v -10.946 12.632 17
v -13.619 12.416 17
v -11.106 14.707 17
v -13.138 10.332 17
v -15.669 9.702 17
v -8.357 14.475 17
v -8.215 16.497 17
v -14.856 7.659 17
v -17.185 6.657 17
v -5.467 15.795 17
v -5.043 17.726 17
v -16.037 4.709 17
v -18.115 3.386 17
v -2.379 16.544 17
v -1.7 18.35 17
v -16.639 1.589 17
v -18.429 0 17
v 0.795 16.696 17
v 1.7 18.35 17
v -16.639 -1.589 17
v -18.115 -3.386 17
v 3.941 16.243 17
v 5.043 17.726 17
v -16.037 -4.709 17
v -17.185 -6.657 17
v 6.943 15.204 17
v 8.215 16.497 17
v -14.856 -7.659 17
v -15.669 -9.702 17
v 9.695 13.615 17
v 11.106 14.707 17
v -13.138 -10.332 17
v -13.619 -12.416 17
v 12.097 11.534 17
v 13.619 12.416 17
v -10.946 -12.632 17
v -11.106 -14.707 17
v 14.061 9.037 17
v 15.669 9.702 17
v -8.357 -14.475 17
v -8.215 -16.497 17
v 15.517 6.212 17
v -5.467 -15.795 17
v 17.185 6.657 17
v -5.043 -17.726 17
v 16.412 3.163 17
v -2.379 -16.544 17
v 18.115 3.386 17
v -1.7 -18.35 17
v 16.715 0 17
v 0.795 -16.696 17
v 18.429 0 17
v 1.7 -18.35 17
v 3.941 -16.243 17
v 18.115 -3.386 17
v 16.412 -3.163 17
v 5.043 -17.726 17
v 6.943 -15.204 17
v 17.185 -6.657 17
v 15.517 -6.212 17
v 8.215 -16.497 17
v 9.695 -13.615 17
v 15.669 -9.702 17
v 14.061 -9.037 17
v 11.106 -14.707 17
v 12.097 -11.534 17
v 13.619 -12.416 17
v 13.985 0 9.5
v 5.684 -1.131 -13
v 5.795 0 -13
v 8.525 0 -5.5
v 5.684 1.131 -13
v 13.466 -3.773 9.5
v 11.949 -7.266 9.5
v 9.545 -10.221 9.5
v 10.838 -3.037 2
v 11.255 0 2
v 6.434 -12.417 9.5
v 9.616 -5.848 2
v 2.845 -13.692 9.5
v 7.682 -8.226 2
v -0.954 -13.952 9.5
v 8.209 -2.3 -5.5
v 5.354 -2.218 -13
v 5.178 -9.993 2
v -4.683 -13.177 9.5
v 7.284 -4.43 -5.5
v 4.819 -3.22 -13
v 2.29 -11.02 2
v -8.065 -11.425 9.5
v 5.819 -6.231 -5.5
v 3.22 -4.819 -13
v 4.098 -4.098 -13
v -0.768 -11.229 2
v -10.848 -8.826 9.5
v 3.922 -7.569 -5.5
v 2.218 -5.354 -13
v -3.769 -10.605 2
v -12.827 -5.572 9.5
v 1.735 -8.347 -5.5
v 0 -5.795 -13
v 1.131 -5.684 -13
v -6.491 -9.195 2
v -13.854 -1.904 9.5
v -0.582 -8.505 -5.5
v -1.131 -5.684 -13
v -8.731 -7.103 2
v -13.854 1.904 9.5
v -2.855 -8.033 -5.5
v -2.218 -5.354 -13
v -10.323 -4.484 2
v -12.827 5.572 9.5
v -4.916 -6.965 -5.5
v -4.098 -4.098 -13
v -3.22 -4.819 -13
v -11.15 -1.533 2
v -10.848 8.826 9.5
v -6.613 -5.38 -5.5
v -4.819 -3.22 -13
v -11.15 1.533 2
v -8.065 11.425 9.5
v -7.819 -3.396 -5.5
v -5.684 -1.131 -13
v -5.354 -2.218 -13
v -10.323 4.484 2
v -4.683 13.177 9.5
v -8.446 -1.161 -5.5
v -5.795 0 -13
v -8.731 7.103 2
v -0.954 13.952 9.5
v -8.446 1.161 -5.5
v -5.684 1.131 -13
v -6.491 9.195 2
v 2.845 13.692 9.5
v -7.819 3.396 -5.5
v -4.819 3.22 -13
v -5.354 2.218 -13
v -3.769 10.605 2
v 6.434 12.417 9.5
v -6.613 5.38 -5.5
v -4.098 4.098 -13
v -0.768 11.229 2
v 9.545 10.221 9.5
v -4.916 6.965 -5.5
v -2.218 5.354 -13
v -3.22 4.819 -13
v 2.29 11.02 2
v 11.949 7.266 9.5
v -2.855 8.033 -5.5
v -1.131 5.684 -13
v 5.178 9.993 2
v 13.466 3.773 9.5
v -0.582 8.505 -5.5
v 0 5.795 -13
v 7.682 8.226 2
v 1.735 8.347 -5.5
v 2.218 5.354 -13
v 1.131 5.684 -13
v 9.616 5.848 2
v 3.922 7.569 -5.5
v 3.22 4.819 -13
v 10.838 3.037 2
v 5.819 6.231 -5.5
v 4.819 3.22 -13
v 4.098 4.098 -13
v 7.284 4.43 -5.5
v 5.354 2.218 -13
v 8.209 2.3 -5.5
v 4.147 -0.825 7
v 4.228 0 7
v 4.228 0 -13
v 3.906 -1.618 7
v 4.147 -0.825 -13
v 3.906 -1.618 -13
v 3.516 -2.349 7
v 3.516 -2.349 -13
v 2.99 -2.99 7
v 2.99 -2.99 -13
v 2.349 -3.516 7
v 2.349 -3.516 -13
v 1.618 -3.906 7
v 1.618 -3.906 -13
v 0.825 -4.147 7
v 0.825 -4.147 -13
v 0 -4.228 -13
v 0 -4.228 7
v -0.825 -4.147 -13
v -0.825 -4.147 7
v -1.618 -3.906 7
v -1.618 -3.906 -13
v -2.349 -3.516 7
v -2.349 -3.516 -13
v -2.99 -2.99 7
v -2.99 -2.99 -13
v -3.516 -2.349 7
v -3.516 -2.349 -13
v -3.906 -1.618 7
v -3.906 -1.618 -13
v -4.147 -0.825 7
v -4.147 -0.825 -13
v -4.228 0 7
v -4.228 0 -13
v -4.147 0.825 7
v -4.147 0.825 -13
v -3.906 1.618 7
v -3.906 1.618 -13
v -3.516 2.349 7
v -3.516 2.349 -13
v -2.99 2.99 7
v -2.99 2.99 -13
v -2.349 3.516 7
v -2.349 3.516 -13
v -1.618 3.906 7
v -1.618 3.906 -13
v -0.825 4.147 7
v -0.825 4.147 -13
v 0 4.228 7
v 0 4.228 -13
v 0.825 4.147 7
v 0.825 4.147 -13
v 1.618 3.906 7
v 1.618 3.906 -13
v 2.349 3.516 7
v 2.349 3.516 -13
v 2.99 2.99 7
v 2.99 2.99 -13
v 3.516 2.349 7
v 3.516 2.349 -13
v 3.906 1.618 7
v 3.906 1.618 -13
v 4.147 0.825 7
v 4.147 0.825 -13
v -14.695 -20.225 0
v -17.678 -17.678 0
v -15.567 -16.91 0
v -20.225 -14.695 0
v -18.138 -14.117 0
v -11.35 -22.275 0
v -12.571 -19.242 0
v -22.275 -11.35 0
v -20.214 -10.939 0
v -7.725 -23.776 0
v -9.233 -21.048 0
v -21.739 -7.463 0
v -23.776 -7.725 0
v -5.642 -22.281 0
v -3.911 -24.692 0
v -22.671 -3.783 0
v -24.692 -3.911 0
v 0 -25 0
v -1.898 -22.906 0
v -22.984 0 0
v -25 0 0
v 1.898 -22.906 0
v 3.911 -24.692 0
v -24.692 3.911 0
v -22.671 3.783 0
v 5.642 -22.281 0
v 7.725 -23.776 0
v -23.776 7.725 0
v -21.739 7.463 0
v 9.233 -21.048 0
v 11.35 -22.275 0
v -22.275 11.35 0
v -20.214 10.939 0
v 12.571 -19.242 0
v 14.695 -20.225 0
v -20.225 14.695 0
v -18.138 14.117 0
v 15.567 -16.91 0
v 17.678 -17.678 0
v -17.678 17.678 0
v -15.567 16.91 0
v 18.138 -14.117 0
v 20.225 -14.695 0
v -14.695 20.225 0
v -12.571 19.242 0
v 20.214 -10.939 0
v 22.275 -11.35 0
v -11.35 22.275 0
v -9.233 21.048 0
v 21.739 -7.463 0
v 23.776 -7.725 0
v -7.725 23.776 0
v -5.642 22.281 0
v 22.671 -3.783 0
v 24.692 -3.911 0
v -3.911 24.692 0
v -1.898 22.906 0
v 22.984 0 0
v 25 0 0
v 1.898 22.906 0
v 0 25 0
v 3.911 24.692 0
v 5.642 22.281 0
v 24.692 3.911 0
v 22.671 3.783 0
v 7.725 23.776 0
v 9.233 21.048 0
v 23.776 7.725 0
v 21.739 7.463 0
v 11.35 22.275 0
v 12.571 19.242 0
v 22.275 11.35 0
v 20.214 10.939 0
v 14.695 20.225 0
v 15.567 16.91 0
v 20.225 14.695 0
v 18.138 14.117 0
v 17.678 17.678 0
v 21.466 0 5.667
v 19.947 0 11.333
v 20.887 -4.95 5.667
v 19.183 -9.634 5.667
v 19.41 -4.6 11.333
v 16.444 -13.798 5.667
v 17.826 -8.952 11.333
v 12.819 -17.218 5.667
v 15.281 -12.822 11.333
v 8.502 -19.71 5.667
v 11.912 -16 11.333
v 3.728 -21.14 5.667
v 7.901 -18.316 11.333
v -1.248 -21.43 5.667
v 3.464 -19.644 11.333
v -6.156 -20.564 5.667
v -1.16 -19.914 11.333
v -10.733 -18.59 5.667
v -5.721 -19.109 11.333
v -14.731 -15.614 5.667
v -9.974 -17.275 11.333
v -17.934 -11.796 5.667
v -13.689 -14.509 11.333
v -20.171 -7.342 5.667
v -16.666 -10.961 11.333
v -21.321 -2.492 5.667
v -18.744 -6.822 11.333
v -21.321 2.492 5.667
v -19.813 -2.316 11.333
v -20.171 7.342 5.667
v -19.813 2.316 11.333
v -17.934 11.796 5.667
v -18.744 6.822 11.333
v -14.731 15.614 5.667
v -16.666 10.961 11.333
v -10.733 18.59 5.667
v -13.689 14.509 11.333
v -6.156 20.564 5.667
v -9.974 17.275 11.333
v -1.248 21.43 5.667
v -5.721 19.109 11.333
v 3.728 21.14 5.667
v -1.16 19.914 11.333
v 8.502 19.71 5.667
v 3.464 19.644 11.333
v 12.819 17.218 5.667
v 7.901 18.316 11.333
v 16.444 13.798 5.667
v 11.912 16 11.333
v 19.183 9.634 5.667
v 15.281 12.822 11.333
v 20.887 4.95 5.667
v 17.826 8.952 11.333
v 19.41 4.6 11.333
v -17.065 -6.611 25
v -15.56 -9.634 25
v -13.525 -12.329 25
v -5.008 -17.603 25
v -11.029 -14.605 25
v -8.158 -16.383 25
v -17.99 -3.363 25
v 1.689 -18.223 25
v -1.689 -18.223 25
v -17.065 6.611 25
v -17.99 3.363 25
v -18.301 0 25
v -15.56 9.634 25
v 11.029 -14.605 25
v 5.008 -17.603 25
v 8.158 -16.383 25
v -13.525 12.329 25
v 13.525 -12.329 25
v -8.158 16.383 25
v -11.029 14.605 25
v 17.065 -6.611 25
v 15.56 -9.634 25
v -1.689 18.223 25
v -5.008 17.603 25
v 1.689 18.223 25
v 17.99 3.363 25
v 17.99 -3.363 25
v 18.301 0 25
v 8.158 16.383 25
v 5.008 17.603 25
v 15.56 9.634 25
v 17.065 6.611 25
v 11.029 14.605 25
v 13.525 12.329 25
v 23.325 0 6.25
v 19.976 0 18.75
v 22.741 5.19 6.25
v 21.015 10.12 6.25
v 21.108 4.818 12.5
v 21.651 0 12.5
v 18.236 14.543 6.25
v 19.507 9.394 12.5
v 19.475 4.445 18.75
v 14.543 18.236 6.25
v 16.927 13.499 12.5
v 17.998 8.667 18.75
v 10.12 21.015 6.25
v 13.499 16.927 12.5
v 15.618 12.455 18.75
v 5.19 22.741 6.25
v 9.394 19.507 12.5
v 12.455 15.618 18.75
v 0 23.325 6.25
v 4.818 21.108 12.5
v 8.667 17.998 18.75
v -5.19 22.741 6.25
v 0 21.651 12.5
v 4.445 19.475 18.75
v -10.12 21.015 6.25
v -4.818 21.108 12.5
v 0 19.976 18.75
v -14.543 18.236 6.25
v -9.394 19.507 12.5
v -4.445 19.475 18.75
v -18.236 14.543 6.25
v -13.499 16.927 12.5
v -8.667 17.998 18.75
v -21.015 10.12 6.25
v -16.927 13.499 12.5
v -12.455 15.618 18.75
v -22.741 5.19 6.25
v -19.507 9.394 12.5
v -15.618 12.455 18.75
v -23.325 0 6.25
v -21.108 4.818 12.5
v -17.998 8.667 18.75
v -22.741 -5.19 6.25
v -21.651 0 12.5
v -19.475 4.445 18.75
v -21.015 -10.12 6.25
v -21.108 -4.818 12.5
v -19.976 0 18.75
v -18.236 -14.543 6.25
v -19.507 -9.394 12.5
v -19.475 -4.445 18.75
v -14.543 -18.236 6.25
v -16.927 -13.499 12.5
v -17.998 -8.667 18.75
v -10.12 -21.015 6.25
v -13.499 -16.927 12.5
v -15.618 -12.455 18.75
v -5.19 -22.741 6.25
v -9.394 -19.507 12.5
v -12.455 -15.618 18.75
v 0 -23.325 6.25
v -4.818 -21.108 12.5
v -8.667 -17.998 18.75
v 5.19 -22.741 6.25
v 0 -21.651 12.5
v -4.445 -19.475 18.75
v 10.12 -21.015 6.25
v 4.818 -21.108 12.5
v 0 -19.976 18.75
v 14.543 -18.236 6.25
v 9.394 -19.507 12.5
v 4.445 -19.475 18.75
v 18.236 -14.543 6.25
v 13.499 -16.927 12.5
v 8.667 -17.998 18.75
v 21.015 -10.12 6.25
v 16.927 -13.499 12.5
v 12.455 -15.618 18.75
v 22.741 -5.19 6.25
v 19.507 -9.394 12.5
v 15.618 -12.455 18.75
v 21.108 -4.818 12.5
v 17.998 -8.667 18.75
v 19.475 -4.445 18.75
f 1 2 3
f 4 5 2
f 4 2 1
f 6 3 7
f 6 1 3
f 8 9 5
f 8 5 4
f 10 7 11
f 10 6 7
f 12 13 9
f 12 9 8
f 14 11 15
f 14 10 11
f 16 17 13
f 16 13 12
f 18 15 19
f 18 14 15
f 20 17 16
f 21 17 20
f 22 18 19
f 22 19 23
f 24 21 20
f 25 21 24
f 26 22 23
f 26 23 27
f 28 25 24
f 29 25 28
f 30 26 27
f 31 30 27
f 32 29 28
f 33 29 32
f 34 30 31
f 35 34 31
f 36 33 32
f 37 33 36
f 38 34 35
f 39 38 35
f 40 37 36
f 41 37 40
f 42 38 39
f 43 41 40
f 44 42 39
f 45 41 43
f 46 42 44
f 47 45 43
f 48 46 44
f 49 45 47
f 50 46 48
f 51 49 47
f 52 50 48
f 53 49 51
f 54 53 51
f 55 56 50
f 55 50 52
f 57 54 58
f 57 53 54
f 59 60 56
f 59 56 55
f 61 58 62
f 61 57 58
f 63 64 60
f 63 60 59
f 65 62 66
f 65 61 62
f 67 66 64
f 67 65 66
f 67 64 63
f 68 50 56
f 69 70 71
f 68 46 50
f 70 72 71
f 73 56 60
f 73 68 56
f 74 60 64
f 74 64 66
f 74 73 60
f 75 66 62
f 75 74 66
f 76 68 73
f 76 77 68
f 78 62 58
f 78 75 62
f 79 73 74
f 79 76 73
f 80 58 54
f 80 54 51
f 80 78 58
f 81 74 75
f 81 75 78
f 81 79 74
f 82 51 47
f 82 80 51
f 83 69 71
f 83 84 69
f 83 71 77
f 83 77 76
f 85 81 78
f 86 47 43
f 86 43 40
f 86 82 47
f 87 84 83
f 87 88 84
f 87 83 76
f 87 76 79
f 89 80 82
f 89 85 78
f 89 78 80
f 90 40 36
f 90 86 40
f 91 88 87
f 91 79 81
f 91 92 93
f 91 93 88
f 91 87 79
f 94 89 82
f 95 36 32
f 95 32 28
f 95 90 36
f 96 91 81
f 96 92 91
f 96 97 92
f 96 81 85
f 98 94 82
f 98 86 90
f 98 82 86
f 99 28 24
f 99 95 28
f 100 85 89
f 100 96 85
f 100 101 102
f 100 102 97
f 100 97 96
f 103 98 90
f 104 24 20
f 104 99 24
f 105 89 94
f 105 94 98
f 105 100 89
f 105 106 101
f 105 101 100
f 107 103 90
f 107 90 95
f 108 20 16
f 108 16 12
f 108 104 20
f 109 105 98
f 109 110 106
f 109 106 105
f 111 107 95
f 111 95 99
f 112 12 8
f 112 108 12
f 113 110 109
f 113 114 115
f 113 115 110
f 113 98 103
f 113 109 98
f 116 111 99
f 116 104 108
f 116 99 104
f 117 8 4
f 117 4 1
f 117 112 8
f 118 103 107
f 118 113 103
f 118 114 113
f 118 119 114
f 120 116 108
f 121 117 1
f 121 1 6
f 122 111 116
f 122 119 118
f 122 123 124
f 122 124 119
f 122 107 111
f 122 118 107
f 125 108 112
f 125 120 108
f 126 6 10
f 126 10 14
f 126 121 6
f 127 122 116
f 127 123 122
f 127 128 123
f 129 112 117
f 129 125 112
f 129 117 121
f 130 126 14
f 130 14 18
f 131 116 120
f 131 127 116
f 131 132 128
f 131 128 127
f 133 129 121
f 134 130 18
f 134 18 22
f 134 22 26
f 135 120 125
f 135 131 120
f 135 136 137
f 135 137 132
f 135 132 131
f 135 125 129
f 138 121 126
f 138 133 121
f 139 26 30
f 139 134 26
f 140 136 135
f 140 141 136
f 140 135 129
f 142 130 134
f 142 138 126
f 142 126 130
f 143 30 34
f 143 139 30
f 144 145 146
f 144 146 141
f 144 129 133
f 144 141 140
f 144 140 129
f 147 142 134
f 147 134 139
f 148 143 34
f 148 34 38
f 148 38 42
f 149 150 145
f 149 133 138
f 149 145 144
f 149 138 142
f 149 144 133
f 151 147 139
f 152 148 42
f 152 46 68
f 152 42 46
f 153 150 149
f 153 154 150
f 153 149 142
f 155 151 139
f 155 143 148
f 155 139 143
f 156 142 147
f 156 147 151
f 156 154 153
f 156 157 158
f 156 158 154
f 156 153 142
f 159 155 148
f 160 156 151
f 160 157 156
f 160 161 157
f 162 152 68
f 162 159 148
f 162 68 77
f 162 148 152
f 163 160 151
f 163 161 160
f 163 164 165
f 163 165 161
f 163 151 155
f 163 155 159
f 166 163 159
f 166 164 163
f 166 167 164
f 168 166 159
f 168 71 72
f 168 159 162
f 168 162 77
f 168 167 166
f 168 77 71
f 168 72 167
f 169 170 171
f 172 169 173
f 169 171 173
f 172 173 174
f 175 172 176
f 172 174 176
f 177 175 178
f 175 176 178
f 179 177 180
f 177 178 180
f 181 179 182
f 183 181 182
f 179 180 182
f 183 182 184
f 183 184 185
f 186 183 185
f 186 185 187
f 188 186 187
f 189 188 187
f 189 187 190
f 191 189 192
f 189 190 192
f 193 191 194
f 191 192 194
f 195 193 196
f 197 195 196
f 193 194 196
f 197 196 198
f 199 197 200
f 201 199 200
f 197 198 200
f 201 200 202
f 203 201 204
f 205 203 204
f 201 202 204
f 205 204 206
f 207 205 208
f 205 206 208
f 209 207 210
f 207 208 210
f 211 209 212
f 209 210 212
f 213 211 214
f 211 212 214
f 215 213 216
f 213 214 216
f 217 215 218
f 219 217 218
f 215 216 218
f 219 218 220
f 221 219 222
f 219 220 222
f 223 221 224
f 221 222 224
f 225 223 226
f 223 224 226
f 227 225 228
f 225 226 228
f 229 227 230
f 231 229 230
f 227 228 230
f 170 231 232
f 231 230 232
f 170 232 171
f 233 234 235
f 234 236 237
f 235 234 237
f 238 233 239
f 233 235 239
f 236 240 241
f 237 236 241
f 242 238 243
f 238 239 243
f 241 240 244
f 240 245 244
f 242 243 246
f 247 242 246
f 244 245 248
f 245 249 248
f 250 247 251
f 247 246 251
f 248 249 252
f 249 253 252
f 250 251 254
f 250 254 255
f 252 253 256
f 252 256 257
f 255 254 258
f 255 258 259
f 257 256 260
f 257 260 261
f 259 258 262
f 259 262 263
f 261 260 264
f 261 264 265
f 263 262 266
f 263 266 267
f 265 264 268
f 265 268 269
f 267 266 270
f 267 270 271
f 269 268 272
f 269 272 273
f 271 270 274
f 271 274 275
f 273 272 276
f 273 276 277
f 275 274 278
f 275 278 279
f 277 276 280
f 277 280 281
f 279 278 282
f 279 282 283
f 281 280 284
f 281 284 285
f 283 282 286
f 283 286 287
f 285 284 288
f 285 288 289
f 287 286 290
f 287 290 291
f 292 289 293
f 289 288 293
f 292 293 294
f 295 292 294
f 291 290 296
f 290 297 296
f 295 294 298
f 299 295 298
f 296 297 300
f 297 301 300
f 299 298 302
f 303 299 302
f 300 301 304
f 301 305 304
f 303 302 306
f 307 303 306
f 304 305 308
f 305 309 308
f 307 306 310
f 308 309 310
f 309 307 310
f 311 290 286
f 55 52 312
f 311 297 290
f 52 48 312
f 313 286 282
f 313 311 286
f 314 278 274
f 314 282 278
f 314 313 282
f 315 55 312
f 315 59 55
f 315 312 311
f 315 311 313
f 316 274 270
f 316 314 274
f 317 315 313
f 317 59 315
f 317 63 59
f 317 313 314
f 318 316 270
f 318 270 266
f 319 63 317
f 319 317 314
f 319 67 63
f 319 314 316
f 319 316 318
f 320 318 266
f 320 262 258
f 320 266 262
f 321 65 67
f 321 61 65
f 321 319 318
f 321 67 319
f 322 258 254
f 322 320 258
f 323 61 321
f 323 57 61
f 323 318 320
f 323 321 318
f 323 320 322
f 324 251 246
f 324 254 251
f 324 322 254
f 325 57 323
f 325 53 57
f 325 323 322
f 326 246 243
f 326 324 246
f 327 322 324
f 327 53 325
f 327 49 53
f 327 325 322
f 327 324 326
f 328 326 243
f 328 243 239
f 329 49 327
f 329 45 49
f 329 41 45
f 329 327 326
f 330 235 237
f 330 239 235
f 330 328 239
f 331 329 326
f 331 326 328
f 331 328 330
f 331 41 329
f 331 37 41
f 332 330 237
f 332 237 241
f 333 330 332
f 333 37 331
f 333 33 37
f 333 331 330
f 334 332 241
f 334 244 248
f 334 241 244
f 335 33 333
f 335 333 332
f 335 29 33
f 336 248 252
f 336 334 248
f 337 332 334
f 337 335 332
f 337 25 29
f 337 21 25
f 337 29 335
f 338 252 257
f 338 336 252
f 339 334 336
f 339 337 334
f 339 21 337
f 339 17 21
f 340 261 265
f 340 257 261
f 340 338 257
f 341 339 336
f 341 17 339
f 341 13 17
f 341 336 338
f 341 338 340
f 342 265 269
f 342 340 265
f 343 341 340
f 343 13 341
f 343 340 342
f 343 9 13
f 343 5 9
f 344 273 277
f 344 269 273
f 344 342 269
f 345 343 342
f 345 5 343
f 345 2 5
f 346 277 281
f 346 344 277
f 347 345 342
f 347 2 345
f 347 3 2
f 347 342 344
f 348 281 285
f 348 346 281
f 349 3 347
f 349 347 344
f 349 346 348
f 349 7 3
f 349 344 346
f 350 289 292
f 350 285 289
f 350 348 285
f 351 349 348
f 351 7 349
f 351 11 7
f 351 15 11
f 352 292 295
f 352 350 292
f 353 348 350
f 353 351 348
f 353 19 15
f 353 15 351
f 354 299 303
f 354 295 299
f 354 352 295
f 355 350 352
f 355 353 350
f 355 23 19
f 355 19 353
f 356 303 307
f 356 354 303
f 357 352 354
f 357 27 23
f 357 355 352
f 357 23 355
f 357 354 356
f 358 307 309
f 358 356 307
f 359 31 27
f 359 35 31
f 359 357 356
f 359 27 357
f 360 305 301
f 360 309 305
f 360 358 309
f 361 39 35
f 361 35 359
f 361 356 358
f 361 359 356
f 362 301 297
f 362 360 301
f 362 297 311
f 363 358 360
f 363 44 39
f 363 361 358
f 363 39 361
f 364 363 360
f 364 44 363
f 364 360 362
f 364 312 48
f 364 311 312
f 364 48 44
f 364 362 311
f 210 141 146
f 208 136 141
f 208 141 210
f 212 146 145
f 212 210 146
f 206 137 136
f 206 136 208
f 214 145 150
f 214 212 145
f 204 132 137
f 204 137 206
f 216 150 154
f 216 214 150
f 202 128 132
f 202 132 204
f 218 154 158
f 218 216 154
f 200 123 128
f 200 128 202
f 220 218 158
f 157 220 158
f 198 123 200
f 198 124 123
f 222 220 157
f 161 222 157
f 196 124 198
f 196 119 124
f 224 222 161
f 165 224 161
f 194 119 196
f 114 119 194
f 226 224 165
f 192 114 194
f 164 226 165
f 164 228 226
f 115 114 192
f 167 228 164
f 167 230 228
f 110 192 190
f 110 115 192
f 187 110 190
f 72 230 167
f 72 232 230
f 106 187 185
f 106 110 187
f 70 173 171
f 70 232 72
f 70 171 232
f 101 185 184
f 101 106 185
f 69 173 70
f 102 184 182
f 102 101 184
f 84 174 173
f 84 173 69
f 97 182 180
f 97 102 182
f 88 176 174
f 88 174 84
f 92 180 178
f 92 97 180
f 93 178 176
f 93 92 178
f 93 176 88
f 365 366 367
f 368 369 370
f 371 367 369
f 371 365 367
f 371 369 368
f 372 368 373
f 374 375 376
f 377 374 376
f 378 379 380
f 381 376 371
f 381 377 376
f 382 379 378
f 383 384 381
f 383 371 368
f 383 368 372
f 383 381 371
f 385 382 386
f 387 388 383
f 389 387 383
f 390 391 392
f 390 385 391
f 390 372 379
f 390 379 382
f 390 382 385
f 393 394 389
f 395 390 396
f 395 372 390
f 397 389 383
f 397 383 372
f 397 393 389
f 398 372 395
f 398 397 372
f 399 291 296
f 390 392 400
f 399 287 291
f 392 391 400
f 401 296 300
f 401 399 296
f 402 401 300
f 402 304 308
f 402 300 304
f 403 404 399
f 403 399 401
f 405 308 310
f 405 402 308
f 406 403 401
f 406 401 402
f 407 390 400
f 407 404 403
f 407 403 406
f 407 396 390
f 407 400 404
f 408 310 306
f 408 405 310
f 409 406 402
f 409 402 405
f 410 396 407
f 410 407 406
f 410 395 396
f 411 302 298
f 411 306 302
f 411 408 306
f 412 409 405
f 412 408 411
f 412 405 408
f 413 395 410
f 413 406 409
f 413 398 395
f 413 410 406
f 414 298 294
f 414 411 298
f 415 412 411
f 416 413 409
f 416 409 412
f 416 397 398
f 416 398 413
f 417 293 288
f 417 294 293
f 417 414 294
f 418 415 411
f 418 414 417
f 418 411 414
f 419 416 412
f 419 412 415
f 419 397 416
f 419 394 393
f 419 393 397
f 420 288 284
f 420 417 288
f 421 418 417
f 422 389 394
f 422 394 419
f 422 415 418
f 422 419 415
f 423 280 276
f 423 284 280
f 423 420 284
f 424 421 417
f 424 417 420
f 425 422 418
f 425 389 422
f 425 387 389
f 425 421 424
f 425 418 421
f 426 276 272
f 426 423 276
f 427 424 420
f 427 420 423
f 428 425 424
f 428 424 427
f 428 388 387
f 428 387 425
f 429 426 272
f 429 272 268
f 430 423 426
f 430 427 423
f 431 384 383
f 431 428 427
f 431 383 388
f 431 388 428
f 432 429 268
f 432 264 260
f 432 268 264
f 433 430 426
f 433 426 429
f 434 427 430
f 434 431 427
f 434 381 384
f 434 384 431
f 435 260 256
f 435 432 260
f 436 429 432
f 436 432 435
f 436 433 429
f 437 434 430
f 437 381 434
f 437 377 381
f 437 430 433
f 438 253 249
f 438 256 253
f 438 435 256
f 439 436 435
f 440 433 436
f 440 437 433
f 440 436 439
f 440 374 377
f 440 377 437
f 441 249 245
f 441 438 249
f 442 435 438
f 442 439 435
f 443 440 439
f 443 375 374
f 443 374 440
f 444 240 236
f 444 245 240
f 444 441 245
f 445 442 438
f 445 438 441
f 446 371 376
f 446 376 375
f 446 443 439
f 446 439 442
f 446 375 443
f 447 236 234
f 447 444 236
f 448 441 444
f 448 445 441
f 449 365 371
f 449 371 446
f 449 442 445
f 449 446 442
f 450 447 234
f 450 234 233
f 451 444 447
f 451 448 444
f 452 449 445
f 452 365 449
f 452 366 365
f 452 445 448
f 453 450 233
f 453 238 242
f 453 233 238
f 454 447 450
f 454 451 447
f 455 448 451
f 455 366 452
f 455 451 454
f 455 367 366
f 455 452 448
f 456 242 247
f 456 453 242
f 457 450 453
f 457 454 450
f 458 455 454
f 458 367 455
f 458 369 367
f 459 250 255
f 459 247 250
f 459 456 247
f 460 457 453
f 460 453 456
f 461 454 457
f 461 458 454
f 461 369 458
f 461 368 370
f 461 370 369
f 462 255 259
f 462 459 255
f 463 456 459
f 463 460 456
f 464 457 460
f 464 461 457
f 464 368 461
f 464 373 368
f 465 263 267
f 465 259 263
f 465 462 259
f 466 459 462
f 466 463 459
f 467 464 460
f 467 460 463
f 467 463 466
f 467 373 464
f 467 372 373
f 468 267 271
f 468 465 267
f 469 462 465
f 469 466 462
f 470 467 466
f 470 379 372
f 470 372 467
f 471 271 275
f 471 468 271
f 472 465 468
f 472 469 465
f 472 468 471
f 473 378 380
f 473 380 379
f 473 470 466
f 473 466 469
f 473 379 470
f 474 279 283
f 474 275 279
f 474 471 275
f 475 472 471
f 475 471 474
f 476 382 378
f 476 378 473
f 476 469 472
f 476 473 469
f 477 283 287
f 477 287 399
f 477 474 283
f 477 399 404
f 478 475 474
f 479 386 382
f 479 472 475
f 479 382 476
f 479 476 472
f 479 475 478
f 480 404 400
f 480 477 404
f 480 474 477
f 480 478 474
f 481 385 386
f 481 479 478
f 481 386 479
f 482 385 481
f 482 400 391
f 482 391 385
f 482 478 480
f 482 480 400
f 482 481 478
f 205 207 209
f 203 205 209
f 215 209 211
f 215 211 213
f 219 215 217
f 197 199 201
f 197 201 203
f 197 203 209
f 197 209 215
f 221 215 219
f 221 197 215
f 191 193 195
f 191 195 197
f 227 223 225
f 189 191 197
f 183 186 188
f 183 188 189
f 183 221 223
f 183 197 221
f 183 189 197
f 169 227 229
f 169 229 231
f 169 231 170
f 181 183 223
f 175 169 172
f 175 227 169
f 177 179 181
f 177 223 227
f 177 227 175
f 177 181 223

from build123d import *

# Parameters (mm, degrees)
SKETCH_R        = 25
PAD_DEPTH       = 25
PAD_TAPER       = 15
SKETCH001_R     = 22.984215
POCKET_DEPTH    = 17
POCKET_TAPER    = 15
SKETCH002_R     = 16.714516
PAD001_DEPTH    = 30
PAD001_TAPER    = 20
SKETCH003_R     = 4.228339
POCKET001_DEPTH = 20


with BuildPart() as part:
    # Sketch → Pad (new body)
    with BuildSketch(Plane.XY):
        Circle(SKETCH_R)
    extrude(amount=PAD_DEPTH, taper=PAD_TAPER)

    # Sketch001 (on Face2 of Pad) → Pocket (cut)
    with BuildSketch(Plane(origin=(0, 0, 0), x_dir=(1, 0, 0), z_dir=(0, 0, -1))):
        Circle(SKETCH001_R)
    extrude(amount=-POCKET_DEPTH, taper=POCKET_TAPER, mode=Mode.SUBTRACT)

    # Sketch002 (on Face5 of Pocket) → Pad001 (join)
    with BuildSketch(Plane(origin=(0, 0, 17), x_dir=(1, 0, 0), z_dir=(0, 0, -1))):
        Circle(SKETCH002_R)
    extrude(amount=PAD001_DEPTH, taper=PAD001_TAPER)

    # Sketch003 (on Face7 of Pad001) → Pocket001 (cut)
    with BuildSketch(Plane(origin=(0, 0, -13), x_dir=(1, 0, 0), z_dir=(0, 0, -1))):
        Circle(SKETCH003_R)
    extrude(amount=-POCKET001_DEPTH, mode=Mode.SUBTRACT)


solid = part.part
